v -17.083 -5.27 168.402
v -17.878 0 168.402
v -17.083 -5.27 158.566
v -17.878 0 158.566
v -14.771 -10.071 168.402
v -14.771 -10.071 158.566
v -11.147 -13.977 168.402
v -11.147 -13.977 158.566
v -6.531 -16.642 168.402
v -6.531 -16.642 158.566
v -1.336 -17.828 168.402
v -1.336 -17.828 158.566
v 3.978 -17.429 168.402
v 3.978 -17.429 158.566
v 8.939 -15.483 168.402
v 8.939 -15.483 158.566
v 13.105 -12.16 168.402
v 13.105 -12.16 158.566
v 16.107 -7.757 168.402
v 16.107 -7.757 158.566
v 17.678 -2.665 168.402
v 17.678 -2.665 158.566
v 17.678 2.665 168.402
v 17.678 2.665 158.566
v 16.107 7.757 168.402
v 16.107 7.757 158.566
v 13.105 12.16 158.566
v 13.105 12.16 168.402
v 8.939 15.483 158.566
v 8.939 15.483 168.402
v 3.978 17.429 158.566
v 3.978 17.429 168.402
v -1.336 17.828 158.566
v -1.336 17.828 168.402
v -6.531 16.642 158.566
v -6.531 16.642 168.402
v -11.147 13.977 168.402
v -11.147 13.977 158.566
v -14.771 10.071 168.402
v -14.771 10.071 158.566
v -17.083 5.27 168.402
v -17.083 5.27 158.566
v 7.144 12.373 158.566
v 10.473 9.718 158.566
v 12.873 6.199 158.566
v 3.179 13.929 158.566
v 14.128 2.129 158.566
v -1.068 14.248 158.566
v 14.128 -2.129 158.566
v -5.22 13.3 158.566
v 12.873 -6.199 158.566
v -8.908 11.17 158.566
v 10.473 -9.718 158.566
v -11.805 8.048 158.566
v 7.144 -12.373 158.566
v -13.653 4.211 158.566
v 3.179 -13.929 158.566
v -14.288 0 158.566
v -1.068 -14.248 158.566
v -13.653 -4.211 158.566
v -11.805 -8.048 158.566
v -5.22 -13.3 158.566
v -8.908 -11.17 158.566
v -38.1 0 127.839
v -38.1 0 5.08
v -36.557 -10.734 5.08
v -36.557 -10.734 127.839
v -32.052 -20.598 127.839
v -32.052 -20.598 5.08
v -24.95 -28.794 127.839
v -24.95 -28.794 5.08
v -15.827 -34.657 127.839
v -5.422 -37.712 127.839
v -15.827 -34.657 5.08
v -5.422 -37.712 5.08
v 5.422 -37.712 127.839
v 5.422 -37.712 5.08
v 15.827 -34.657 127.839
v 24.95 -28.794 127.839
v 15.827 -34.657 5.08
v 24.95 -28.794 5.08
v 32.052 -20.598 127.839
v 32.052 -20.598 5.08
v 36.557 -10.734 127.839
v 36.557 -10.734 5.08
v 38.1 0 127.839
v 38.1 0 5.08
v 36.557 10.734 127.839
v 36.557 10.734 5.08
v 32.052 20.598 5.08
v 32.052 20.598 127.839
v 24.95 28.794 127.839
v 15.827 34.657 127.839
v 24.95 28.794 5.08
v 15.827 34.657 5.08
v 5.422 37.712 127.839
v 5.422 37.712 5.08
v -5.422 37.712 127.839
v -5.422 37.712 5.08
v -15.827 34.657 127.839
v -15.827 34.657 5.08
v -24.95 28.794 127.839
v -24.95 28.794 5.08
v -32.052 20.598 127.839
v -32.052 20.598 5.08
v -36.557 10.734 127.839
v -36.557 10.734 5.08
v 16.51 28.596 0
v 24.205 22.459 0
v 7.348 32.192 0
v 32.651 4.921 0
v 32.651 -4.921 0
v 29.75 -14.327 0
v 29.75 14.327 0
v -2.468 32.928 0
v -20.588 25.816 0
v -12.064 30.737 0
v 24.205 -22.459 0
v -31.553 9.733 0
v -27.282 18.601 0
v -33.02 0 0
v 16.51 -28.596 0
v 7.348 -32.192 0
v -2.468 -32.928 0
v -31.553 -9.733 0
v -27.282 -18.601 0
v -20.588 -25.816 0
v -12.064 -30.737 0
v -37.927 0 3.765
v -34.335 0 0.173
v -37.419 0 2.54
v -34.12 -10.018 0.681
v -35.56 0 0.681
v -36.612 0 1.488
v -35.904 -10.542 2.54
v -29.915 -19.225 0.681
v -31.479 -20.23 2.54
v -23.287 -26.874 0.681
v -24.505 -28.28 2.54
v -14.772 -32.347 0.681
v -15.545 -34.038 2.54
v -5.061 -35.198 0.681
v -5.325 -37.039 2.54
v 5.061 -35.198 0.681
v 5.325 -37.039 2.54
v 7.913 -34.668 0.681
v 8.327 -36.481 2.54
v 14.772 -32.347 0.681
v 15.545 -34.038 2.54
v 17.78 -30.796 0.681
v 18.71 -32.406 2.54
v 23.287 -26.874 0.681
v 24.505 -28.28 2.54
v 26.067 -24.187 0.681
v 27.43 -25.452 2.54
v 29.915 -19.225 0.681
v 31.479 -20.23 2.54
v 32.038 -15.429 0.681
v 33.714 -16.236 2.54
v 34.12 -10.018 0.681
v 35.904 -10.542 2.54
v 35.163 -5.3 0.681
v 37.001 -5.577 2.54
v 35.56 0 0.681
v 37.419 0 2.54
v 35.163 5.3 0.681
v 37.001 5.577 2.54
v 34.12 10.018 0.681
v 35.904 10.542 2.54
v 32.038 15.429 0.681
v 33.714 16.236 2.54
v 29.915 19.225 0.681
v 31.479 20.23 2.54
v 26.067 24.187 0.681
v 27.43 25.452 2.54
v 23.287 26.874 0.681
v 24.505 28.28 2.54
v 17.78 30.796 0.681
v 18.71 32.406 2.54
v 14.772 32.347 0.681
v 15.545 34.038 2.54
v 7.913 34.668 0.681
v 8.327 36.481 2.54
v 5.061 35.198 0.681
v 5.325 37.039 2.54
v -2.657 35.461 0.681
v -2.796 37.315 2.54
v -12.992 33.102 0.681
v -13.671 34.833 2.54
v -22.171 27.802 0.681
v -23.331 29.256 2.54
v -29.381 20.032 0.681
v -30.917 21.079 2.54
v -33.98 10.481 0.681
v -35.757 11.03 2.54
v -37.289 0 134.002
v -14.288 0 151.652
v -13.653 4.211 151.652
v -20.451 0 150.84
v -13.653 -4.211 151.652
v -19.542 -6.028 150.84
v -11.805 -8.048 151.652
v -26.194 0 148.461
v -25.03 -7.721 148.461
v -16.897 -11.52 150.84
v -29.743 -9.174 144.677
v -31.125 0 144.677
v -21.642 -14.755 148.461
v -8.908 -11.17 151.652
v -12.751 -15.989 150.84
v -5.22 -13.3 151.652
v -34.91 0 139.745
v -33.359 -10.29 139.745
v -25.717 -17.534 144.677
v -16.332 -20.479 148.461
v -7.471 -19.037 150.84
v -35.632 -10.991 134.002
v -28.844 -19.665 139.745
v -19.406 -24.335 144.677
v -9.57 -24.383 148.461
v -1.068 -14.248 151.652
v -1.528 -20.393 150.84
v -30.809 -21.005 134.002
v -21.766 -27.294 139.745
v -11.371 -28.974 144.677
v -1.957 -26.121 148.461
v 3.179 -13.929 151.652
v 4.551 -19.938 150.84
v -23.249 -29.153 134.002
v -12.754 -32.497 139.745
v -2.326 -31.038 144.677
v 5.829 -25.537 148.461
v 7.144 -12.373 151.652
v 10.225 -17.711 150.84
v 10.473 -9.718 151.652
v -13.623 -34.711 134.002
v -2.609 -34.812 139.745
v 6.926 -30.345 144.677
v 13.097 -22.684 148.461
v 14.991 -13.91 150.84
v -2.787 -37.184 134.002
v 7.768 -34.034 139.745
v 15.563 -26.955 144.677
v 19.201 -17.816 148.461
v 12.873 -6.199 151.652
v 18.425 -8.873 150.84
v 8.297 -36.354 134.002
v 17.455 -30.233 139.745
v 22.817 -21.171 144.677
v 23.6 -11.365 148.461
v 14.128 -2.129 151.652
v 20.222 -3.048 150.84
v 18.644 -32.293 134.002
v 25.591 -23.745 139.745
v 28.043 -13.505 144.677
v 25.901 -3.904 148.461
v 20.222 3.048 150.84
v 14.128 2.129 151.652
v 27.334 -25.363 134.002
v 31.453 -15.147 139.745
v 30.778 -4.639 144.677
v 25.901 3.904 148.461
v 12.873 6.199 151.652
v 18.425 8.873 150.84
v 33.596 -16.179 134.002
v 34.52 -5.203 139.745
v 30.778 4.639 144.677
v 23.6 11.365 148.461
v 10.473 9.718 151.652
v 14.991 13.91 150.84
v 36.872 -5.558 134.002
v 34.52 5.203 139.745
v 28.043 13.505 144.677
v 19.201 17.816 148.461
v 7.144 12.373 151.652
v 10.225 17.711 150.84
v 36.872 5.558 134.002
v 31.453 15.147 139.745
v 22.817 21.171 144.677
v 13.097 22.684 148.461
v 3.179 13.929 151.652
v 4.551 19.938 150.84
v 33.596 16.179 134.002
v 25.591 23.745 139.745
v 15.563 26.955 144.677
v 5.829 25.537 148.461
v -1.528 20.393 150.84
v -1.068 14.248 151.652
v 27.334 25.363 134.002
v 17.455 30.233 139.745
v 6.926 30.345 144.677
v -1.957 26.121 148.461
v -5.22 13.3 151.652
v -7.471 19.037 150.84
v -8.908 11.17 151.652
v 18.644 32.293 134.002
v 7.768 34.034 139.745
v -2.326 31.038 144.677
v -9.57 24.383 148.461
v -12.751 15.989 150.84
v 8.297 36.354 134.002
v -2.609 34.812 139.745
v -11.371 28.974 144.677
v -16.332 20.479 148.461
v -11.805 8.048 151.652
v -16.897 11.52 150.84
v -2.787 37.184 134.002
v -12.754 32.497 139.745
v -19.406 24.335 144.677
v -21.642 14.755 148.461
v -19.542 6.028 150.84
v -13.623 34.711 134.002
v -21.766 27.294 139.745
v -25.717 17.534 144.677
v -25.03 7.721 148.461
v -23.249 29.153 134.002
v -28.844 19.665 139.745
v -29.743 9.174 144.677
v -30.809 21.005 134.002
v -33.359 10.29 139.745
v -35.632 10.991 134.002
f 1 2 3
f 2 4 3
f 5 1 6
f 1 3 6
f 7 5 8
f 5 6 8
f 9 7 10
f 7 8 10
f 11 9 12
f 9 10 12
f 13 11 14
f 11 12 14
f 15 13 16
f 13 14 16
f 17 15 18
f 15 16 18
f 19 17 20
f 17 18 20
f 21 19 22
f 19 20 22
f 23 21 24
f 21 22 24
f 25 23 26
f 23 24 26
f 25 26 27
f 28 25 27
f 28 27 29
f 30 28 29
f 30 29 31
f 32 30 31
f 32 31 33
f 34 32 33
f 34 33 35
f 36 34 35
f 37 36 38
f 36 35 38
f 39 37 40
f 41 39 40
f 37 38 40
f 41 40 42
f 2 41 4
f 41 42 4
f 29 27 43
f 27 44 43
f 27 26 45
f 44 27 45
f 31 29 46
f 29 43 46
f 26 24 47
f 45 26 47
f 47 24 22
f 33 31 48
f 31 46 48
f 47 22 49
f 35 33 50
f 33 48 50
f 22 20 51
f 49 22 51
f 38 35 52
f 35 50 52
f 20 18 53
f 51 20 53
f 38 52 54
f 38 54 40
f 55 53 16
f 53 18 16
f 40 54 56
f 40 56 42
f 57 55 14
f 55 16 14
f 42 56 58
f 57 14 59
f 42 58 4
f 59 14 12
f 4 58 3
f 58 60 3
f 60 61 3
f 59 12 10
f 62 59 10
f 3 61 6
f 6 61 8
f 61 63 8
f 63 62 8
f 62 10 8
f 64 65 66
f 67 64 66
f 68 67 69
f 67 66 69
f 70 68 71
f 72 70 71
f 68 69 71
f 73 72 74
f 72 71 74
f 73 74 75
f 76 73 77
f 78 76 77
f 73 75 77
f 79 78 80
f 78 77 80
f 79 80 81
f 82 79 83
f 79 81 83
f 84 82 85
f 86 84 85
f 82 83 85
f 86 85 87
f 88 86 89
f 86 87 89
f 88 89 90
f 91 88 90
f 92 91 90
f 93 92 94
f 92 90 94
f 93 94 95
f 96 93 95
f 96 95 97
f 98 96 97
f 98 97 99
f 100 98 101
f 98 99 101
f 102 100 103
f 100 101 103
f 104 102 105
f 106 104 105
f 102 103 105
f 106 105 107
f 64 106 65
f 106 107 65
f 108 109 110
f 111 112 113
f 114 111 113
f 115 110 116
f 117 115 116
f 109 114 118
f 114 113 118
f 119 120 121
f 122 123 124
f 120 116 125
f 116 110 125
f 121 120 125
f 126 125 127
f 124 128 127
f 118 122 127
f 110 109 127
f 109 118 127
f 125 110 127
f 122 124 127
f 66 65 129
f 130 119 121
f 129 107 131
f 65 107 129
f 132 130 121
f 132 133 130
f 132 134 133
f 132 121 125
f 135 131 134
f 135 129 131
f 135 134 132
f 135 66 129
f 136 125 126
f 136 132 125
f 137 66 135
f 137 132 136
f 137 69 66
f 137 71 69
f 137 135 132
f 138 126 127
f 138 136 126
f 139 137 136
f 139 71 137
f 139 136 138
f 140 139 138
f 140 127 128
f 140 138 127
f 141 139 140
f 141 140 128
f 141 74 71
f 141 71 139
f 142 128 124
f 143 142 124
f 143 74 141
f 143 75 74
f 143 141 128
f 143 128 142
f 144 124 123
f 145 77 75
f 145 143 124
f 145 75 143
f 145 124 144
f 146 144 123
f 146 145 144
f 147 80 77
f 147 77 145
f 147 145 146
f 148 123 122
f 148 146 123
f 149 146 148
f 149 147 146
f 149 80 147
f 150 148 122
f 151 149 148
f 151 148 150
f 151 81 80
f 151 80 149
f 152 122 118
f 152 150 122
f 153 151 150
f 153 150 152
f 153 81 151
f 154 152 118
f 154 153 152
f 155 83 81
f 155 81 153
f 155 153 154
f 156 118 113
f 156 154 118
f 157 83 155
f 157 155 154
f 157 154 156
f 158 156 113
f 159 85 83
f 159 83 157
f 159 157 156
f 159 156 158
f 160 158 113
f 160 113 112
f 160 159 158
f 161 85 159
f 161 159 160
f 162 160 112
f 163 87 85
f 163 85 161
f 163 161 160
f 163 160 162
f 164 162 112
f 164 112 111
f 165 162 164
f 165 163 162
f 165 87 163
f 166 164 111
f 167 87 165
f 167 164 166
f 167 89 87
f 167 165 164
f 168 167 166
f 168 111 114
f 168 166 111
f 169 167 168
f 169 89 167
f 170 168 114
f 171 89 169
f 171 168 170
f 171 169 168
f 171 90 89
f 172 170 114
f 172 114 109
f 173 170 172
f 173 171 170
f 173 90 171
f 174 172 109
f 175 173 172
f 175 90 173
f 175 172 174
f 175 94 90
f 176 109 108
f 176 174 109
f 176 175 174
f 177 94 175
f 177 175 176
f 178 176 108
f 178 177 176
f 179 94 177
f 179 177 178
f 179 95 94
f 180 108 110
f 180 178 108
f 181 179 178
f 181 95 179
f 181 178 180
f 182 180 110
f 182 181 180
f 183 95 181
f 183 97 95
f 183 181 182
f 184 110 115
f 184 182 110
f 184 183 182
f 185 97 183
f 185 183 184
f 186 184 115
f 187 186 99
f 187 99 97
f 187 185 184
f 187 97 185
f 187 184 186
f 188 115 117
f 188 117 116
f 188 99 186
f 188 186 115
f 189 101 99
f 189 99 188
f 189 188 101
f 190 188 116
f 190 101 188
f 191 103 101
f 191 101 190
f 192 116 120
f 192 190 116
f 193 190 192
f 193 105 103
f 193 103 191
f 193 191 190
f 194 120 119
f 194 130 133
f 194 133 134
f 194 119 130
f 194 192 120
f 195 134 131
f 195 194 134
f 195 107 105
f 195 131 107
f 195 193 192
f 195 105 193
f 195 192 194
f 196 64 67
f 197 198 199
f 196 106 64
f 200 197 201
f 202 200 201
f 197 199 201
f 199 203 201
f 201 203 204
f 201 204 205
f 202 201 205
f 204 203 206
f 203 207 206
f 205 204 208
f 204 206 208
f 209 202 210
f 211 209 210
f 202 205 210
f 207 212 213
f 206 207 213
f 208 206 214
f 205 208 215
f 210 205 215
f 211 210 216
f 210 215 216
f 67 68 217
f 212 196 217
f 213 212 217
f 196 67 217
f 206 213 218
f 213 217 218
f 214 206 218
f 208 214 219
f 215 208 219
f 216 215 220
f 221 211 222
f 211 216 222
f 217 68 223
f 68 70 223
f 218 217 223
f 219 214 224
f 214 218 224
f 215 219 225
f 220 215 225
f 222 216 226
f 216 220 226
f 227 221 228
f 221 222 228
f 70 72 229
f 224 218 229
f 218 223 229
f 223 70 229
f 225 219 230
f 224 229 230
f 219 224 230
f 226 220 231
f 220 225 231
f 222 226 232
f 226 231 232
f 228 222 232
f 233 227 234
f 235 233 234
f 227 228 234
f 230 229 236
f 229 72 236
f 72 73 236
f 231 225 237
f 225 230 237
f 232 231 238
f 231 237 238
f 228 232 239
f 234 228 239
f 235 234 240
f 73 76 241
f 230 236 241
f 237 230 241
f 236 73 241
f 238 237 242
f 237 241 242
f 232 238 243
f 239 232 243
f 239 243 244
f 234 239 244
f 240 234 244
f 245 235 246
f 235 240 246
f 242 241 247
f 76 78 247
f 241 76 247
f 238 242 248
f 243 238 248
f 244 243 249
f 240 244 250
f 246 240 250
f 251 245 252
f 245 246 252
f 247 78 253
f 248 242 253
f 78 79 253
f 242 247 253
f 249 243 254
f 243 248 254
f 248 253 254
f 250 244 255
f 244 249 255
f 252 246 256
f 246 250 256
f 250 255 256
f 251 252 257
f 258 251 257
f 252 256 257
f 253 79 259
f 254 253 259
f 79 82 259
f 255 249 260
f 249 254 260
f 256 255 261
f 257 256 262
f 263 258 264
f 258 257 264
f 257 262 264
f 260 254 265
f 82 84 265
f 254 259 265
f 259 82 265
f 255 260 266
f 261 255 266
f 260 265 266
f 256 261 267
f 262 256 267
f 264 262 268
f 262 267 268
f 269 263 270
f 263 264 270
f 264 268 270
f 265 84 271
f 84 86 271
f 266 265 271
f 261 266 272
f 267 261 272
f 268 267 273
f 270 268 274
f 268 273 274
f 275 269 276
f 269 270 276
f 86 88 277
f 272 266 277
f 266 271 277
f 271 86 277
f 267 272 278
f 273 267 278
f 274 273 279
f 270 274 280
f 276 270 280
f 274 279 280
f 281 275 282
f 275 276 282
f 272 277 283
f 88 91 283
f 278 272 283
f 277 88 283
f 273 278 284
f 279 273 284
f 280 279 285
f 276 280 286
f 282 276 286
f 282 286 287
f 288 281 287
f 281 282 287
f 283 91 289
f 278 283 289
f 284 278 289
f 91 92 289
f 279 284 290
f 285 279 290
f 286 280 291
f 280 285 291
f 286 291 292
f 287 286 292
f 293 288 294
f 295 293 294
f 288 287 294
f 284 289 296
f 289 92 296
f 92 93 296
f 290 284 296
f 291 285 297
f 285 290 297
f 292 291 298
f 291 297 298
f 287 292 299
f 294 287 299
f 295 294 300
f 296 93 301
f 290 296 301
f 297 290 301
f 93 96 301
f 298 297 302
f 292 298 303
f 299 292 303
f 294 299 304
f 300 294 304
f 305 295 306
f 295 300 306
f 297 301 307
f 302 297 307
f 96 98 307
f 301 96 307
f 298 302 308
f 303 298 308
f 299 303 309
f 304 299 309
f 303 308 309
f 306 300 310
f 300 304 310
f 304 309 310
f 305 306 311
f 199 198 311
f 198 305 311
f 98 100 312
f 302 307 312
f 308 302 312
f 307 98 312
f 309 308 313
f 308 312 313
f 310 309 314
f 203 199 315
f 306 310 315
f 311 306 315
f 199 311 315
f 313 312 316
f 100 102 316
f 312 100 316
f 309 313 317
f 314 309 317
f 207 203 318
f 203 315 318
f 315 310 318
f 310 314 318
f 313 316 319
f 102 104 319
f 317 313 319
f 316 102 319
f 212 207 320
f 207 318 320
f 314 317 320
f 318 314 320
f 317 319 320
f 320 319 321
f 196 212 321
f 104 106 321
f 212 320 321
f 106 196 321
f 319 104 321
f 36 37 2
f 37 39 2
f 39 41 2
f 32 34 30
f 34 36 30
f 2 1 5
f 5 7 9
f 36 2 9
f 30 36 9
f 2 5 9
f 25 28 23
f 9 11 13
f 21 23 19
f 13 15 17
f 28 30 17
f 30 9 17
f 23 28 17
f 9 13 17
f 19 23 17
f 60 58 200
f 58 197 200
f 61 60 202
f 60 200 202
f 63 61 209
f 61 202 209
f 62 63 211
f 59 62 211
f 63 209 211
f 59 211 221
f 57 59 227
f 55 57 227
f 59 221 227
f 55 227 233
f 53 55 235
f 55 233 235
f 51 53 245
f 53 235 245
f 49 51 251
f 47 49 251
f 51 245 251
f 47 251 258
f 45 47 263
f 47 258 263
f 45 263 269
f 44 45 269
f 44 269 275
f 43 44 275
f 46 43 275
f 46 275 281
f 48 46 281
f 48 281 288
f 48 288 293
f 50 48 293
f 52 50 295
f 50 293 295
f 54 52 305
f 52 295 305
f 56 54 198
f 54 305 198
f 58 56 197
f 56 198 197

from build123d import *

# Parameters (mm, degrees)
F2_R = 5.08


with BuildPart() as f1:
    # F0 (on Front) → F1 (revolve)
    with BuildSketch(Plane.XZ):
        with BuildLine():
            Line((-38.1, 0), (0, 0))
            Line((0, 0), (0, 168.402))
            Line((0, 168.402), (-17.877694, 168.402))
            Line((-17.877694, 168.402), (-17.877694, 158.566087))
            Line((-17.877694, 158.566087), (-14.2875, 158.566087))
            Line((-14.2875, 158.566087), (-14.2875, 151.651561))
            ThreePointArc((-14.2875, 151.651561), (-31.12548, 144.677041), (-38.1, 127.839061))
            Line((-38.1, 127.839061), (-38.1, 0))
        make_face()
    revolve(axis=Axis((0, 0, 84.201), (0, 0, 1)))

    # F2
    f2_edges = [f1.edges().sort_by_distance(p)[0] for p in [
        (38.1, 0, 0),
    ]]
    fillet(f2_edges, radius=F2_R)


solid = f1.part
